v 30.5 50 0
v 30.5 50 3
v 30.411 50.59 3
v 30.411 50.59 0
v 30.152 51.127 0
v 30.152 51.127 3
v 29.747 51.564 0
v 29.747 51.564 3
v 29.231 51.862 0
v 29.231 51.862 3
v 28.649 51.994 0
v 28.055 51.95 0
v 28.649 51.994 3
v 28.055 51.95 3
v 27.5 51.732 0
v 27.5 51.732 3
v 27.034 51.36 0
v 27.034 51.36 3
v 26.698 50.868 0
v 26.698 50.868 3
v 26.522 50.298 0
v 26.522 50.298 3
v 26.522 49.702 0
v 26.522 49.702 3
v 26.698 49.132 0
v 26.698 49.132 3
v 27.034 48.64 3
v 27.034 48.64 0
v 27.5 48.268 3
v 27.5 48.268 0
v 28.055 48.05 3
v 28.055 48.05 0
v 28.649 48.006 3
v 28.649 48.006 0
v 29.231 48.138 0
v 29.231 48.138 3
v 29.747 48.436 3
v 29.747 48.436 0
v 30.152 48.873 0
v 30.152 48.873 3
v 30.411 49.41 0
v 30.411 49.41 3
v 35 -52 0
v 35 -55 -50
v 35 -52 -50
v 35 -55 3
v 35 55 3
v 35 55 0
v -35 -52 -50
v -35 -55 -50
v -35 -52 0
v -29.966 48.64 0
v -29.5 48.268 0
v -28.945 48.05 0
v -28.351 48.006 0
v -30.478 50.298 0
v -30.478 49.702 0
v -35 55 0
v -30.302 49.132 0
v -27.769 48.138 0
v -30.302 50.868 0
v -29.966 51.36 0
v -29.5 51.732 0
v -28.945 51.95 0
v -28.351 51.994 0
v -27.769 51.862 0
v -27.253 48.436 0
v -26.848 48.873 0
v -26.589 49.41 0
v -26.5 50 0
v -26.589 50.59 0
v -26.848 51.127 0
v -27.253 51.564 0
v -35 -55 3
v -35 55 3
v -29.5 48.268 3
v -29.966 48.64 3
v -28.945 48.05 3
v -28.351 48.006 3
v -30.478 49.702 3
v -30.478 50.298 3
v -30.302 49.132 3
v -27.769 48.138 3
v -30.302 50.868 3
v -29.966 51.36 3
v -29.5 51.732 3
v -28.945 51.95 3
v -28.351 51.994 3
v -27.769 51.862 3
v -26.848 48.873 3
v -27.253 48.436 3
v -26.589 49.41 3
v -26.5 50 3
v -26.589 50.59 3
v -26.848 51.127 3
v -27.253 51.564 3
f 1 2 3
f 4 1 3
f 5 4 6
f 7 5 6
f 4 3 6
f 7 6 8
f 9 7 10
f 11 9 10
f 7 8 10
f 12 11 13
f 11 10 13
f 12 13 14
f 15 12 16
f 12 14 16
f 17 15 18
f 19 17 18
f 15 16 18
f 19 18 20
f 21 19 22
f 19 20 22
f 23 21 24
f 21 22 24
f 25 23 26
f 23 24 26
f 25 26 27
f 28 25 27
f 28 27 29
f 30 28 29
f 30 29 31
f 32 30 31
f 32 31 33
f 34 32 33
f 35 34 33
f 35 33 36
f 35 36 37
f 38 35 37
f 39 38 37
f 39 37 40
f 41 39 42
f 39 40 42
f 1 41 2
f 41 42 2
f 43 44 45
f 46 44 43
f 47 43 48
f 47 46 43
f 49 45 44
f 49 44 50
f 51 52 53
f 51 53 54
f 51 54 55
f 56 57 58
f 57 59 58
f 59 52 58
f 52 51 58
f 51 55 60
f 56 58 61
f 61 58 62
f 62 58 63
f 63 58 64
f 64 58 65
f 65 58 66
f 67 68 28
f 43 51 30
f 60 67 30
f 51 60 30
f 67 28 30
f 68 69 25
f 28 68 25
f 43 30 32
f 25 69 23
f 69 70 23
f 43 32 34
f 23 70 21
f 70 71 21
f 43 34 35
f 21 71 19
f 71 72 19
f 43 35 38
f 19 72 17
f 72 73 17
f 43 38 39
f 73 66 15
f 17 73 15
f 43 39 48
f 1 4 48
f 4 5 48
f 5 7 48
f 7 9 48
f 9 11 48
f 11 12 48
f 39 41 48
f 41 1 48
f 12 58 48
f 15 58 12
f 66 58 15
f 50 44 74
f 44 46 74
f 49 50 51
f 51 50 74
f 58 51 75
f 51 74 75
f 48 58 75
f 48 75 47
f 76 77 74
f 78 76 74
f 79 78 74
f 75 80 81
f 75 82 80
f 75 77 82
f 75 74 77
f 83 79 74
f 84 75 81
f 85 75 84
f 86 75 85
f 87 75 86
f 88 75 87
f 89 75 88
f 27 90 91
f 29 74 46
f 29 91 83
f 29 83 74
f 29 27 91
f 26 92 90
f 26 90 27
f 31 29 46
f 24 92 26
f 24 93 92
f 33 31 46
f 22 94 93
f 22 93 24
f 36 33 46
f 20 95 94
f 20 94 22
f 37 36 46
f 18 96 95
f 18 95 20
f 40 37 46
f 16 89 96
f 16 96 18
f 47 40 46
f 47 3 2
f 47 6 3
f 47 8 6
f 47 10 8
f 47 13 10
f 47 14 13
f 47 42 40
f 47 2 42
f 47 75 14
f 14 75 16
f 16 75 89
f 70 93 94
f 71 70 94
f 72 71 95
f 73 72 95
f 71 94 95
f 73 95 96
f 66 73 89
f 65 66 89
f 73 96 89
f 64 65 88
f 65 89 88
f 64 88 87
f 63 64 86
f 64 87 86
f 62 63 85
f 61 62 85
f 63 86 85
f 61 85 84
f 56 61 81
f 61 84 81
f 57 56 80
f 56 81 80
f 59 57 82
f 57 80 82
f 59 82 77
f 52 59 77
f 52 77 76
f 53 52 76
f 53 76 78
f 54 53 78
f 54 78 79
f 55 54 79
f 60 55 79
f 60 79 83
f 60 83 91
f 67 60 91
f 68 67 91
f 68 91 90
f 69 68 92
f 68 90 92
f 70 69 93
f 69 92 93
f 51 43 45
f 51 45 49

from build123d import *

# Parameters (mm, degrees)
SKETCH1_W           = 70
SKETCH1_H           = 110
BOSS_EXTRUDE1_DEPTH = 3
SKETCH2_W           = 70
SKETCH2_H           = 3
BOSS_EXTRUDE2_DEPTH = 50
SKETCH3_R           = 2
CUT_EXTRUDE1_DEPTH  = 3


with BuildPart() as part:
    # Sketch1 → Boss-Extrude1 (new body)
    with BuildSketch(Plane.XY):
        Rectangle(SKETCH1_W, SKETCH1_H)
    extrude(amount=BOSS_EXTRUDE1_DEPTH)

    # Sketch2 → Boss-Extrude2 (add)
    with BuildSketch(Plane(origin=(0, 0, 0), x_dir=(-1, 0, 0), z_dir=(0, 0, -1))):
        with Locations((0, -53.5)):
            Rectangle(SKETCH2_W, SKETCH2_H)
    extrude(amount=BOSS_EXTRUDE2_DEPTH)

    # Sketch3 → Cut-Extrude1 (cut)
    with BuildSketch(Plane.XY.offset(3)):
        with Locations((-28.5, 50)):
            Circle(SKETCH3_R)
        with Locations((28.5, 50)):
            Circle(SKETCH3_R)
    extrude(amount=-CUT_EXTRUDE1_DEPTH, mode=Mode.SUBTRACT)


solid = part.part
